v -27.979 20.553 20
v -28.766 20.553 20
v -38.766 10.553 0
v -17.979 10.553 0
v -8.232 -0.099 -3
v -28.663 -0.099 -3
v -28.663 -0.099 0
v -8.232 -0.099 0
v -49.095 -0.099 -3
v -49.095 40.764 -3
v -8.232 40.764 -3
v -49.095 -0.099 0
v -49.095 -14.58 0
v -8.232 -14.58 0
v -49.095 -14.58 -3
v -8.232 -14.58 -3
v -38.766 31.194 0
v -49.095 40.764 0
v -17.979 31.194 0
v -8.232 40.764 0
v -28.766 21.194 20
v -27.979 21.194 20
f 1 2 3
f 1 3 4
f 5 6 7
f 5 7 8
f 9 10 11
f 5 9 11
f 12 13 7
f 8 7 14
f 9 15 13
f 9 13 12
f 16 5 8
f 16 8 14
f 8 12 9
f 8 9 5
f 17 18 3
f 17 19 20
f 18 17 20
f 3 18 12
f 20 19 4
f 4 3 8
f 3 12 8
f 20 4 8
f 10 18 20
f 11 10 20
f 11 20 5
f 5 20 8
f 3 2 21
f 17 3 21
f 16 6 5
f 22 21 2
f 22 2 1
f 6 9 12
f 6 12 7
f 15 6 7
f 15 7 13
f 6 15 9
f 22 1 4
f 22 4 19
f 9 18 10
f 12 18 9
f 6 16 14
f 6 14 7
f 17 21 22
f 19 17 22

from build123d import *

# Parameters (mm, degrees)
F0_W     = 20.7871049643
F0_H     = 20.6407494843
F1_DEPTH = 20
F2_SIZE2 = 9.99999
F2_SIZE  = 19.99999
F3_W     = 40.8627185971
F3_H     = 40.862724185
F4_DEPTH = 3
F6_DEPTH = 3


# Not quite as in the source:
# - a fillet or chamfer is up to 0.001 mm smaller than in the source, because OpenCascade refuses the exact size


with BuildPart() as f1:
    # F0 (on Top) → F1 (new body)
    with BuildSketch(Plane.XY):
        with Locations((-28.3725745976, 20.8737719804)):
            Rectangle(F0_W, F0_H)
    extrude(amount=F1_DEPTH)

    # F2 (size 20 and 10 in the source; OpenCascade refuses exactly that, so slightly less here)
    f2_edges = [f1.edges().sort_by_distance(p)[0] for p in [
        (-17.979022, 20.873772, 20),
        (-38.766127, 20.873772, 20),
        (-28.372575, 10.553397, 20),
        (-28.372575, 31.194147, 20),
    ]]
    chamfer(f2_edges, length=F2_SIZE, length2=F2_SIZE2)

    # F3 (on face) → F4 (join)
    with BuildSketch(Plane(origin=(0, 0, 0), x_dir=(1, 0, 0), z_dir=(0, 0, -1))):
        with Locations((-28.6634135991, -20.3321799636)):
            Rectangle(F3_W, F3_H)
    extrude(amount=F4_DEPTH)


with BuildPart() as f6:
    # F5 (on face) → F6 (new body)
    with BuildSketch(Plane(origin=(0, 0, -3), x_dir=(1, 0, 0), z_dir=(0, 0, -1))):
        Polygon((-49.0947728977, 14.5796602592), (-49.0947728977, 0.0991821289), (-28.6634135991, 0.0991821289), align=None)
    extrude(amount=-F6_DEPTH)


with BuildPart() as f6b:
    # F5 (on face) → F6, piece 2 (new body)
    with BuildSketch(Plane(origin=(0, 0, -3), x_dir=(1, 0, 0), z_dir=(0, 0, -1))):
        Polygon((-8.2320543006, 14.5796602592), (-28.6634135991, 0.0991821289), (-8.2320543006, 0.0991821289), align=None)
    extrude(amount=-F6_DEPTH)


solid = Compound([f1.part, f6.part, f6b.part])
